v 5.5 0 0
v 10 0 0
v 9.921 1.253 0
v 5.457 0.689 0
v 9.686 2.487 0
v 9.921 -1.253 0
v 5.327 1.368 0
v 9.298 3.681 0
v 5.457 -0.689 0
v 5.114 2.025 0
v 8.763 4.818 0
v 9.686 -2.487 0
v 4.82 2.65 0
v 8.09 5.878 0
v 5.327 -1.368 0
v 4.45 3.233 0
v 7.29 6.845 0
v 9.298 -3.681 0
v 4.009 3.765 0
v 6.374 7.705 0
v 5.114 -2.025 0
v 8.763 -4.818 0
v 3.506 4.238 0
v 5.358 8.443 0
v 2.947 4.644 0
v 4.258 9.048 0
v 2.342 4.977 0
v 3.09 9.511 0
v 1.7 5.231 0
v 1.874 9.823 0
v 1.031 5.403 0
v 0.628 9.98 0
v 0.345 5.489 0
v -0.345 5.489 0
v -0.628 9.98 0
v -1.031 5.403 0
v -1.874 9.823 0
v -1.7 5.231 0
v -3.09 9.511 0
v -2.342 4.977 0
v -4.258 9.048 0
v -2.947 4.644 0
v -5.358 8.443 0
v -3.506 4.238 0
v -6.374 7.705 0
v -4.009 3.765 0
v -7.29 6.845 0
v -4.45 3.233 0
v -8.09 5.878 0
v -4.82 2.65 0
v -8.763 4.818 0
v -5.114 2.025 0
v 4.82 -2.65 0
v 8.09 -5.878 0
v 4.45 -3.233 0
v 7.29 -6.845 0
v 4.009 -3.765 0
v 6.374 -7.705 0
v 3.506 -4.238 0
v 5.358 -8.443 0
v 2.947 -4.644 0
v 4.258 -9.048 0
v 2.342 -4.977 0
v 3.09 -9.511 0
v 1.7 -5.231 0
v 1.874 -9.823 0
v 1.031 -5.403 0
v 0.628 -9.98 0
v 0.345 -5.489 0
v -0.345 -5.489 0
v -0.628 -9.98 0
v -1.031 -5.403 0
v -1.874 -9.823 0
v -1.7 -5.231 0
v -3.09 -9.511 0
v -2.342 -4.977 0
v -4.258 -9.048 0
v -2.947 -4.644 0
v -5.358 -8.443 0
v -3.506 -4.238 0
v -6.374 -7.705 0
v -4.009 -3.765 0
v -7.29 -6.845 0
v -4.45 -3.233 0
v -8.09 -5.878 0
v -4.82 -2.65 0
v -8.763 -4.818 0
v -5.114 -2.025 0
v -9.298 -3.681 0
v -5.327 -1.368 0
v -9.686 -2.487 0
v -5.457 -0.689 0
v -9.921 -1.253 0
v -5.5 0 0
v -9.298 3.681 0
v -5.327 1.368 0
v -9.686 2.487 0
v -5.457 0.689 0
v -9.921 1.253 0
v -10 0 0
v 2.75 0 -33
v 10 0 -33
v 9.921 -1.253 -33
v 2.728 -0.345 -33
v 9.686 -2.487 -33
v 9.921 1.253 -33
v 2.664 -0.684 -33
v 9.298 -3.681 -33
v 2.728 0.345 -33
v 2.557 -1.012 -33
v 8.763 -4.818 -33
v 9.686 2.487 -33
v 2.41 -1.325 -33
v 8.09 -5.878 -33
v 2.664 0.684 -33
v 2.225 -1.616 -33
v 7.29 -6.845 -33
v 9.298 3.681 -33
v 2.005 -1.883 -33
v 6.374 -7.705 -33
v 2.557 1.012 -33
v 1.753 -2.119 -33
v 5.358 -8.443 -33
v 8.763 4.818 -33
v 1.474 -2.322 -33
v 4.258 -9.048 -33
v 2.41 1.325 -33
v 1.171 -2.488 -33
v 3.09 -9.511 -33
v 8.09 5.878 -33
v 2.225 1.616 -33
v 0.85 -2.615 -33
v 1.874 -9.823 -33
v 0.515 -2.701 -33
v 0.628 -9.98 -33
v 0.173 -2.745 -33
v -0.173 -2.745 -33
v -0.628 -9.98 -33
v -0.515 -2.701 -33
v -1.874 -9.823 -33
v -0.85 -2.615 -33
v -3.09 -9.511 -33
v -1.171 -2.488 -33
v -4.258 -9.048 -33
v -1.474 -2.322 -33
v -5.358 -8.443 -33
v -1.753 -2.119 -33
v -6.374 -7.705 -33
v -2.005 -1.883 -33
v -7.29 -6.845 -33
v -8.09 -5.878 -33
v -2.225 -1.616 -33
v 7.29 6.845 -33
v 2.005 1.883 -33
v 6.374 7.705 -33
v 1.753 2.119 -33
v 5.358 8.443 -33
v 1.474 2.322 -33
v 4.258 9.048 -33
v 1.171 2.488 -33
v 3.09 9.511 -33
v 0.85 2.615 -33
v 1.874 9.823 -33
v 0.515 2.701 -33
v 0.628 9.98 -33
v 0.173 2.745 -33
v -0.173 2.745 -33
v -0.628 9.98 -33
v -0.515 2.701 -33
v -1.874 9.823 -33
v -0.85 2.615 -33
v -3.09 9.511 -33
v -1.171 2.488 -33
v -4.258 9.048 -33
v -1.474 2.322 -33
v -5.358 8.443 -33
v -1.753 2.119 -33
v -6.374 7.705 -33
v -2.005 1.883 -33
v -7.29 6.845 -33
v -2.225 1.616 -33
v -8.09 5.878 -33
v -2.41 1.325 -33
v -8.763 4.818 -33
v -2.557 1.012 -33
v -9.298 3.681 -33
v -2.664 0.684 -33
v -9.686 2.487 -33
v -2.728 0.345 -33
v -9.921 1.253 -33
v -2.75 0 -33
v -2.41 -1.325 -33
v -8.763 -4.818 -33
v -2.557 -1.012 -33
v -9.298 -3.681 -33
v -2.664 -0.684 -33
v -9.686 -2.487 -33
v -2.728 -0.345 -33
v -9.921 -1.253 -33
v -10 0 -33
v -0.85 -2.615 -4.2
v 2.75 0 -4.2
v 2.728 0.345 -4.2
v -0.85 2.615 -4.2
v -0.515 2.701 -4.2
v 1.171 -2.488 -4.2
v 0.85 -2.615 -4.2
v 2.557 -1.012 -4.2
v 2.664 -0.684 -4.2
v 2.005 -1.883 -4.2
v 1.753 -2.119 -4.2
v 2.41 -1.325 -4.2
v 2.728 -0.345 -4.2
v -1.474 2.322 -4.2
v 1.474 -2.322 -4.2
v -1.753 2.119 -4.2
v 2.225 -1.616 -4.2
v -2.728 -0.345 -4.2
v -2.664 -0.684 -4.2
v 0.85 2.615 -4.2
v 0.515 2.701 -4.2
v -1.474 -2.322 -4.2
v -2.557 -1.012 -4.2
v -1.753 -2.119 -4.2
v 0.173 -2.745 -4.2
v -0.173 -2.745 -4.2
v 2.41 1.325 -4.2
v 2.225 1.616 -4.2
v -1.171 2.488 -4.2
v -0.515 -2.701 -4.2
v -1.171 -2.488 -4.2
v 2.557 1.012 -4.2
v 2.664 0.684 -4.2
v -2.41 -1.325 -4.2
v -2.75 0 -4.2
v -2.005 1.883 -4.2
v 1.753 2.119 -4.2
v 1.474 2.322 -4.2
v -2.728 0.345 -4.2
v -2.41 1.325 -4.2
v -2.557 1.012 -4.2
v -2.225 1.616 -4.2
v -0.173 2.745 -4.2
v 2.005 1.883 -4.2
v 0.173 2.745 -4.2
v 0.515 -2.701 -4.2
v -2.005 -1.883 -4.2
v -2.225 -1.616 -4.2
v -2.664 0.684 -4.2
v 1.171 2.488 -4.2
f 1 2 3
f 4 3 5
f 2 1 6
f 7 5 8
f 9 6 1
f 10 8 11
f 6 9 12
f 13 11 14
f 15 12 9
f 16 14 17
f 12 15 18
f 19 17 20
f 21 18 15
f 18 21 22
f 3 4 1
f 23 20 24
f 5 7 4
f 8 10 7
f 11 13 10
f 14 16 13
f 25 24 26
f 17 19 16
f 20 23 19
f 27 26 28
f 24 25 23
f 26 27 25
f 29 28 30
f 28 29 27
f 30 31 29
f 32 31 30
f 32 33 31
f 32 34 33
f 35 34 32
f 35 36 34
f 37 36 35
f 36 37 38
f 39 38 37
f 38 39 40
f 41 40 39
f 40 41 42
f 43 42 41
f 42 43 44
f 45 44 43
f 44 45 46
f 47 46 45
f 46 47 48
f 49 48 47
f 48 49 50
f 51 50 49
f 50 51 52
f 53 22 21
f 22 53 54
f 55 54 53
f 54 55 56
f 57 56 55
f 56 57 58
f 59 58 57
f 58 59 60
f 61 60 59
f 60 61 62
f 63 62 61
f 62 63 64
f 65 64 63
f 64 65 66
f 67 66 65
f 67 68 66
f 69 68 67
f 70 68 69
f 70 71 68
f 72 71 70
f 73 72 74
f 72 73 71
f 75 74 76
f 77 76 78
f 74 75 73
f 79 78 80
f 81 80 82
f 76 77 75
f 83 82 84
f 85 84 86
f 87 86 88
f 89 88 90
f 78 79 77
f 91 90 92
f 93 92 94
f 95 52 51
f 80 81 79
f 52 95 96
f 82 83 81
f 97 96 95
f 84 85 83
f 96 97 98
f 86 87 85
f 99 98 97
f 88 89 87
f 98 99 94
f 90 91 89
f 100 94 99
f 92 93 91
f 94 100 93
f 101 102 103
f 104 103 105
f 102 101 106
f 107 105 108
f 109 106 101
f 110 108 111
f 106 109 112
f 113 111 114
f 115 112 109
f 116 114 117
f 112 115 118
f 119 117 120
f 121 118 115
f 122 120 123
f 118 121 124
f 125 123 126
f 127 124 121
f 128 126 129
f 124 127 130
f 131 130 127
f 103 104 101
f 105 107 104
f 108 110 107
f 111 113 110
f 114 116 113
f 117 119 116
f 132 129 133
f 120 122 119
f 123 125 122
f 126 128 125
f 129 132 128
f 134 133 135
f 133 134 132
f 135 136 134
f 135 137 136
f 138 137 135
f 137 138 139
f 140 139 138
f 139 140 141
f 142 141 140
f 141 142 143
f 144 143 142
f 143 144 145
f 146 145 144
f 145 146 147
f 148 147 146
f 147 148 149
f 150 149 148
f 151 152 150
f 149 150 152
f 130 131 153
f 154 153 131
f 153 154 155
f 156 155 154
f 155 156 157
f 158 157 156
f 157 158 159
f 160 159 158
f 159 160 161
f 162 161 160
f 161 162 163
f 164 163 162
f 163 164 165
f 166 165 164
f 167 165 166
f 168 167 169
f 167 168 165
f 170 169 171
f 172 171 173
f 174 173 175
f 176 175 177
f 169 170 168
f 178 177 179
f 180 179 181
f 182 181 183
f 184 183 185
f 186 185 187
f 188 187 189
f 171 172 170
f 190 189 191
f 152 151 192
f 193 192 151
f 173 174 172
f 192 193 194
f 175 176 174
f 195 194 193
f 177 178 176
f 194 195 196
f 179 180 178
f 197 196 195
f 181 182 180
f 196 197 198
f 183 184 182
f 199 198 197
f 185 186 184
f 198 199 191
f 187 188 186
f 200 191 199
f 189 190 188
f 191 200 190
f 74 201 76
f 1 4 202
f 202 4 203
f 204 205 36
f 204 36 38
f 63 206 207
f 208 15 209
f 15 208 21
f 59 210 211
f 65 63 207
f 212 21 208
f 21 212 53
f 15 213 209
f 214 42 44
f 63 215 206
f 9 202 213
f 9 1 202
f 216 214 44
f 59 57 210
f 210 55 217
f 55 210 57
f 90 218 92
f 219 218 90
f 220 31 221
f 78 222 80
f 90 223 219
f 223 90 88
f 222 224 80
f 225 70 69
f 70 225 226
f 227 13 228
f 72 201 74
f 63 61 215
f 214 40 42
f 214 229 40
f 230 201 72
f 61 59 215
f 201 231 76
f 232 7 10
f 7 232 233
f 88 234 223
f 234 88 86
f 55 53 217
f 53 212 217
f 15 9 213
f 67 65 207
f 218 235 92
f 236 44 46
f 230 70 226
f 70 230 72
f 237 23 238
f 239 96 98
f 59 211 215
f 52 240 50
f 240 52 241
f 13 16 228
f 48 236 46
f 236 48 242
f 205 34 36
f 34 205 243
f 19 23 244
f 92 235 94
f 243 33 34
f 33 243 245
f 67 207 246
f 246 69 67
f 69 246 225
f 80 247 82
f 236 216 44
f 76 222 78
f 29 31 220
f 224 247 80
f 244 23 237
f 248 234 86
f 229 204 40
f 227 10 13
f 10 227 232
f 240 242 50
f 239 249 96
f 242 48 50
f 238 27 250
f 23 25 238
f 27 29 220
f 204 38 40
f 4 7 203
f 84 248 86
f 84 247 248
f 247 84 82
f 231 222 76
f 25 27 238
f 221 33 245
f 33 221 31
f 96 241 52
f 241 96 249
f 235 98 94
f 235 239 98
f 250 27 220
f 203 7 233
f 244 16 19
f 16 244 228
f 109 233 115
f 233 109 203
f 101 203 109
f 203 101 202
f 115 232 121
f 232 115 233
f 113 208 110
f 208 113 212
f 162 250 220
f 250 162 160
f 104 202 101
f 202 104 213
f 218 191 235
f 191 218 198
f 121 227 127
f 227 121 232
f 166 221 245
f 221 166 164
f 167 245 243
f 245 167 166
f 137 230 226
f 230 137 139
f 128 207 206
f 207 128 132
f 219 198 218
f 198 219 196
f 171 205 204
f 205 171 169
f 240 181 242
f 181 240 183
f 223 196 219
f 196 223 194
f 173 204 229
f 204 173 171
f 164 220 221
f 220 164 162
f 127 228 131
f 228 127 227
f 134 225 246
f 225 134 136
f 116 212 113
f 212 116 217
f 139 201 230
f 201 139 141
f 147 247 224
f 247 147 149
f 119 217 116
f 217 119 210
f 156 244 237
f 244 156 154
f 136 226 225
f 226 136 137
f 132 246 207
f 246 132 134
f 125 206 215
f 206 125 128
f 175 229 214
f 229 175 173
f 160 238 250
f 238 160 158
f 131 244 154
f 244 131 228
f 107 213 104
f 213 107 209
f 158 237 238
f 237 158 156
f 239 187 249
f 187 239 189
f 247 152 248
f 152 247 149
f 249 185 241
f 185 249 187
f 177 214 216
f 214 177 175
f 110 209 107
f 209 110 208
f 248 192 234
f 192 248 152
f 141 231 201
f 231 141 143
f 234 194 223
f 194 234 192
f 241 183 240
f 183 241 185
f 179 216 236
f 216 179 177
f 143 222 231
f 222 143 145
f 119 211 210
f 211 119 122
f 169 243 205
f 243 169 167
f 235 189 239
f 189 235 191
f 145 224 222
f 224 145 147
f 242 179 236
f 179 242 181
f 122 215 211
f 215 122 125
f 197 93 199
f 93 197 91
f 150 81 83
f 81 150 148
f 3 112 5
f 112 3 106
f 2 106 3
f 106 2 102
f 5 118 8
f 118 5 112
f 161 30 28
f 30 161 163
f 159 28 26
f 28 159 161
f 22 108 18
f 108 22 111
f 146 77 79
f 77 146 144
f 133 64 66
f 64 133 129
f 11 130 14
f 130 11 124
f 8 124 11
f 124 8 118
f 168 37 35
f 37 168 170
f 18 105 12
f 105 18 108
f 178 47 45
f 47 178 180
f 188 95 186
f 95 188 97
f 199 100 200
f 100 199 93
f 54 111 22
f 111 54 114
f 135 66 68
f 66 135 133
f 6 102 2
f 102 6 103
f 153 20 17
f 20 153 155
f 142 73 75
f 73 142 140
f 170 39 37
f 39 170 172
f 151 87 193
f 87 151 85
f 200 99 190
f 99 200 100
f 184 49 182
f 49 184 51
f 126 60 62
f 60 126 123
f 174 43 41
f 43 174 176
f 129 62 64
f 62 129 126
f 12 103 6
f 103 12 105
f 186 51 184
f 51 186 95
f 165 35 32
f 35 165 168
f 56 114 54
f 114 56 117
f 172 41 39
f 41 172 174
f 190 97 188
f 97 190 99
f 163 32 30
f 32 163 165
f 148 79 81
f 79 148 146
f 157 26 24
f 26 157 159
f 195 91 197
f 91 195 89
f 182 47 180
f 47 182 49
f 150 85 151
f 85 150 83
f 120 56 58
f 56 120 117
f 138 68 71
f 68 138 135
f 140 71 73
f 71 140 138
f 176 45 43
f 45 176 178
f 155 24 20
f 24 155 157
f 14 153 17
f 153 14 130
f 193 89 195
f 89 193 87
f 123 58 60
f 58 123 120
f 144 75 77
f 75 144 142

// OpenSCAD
$fn = 50;


difference() {
	union() {
		translate(v = [0, 0, -33.0000000000]) {
			cylinder(h = 33, r = 10.0000000000);
		}
	}
	union() {
		translate(v = [0, 0, 0]) {
			rotate(a = [0, 0, 0]) {
				difference() {
					union() {
						#translate(v = [0, 0, -33.0000000000]) {
							cylinder(h = 33, r = 2.2500000000);
						}
						#translate(v = [0, 0, -4.2000000000]) {
							cylinder(h = 4.2000000000, r = 10.0000000000, r1 = 2.7500000000, r2 = 5.5000000000);
						}
						#translate(v = [0, 0, -33.0000000000]) {
							cylinder(h = 33, r = 2.7500000000);
						}
						#translate(v = [0, 0, -33.0000000000]) {
							cylinder(h = 33, r = 2.2500000000);
						}
					}
					union();
				}
			}
		}
	}
}
